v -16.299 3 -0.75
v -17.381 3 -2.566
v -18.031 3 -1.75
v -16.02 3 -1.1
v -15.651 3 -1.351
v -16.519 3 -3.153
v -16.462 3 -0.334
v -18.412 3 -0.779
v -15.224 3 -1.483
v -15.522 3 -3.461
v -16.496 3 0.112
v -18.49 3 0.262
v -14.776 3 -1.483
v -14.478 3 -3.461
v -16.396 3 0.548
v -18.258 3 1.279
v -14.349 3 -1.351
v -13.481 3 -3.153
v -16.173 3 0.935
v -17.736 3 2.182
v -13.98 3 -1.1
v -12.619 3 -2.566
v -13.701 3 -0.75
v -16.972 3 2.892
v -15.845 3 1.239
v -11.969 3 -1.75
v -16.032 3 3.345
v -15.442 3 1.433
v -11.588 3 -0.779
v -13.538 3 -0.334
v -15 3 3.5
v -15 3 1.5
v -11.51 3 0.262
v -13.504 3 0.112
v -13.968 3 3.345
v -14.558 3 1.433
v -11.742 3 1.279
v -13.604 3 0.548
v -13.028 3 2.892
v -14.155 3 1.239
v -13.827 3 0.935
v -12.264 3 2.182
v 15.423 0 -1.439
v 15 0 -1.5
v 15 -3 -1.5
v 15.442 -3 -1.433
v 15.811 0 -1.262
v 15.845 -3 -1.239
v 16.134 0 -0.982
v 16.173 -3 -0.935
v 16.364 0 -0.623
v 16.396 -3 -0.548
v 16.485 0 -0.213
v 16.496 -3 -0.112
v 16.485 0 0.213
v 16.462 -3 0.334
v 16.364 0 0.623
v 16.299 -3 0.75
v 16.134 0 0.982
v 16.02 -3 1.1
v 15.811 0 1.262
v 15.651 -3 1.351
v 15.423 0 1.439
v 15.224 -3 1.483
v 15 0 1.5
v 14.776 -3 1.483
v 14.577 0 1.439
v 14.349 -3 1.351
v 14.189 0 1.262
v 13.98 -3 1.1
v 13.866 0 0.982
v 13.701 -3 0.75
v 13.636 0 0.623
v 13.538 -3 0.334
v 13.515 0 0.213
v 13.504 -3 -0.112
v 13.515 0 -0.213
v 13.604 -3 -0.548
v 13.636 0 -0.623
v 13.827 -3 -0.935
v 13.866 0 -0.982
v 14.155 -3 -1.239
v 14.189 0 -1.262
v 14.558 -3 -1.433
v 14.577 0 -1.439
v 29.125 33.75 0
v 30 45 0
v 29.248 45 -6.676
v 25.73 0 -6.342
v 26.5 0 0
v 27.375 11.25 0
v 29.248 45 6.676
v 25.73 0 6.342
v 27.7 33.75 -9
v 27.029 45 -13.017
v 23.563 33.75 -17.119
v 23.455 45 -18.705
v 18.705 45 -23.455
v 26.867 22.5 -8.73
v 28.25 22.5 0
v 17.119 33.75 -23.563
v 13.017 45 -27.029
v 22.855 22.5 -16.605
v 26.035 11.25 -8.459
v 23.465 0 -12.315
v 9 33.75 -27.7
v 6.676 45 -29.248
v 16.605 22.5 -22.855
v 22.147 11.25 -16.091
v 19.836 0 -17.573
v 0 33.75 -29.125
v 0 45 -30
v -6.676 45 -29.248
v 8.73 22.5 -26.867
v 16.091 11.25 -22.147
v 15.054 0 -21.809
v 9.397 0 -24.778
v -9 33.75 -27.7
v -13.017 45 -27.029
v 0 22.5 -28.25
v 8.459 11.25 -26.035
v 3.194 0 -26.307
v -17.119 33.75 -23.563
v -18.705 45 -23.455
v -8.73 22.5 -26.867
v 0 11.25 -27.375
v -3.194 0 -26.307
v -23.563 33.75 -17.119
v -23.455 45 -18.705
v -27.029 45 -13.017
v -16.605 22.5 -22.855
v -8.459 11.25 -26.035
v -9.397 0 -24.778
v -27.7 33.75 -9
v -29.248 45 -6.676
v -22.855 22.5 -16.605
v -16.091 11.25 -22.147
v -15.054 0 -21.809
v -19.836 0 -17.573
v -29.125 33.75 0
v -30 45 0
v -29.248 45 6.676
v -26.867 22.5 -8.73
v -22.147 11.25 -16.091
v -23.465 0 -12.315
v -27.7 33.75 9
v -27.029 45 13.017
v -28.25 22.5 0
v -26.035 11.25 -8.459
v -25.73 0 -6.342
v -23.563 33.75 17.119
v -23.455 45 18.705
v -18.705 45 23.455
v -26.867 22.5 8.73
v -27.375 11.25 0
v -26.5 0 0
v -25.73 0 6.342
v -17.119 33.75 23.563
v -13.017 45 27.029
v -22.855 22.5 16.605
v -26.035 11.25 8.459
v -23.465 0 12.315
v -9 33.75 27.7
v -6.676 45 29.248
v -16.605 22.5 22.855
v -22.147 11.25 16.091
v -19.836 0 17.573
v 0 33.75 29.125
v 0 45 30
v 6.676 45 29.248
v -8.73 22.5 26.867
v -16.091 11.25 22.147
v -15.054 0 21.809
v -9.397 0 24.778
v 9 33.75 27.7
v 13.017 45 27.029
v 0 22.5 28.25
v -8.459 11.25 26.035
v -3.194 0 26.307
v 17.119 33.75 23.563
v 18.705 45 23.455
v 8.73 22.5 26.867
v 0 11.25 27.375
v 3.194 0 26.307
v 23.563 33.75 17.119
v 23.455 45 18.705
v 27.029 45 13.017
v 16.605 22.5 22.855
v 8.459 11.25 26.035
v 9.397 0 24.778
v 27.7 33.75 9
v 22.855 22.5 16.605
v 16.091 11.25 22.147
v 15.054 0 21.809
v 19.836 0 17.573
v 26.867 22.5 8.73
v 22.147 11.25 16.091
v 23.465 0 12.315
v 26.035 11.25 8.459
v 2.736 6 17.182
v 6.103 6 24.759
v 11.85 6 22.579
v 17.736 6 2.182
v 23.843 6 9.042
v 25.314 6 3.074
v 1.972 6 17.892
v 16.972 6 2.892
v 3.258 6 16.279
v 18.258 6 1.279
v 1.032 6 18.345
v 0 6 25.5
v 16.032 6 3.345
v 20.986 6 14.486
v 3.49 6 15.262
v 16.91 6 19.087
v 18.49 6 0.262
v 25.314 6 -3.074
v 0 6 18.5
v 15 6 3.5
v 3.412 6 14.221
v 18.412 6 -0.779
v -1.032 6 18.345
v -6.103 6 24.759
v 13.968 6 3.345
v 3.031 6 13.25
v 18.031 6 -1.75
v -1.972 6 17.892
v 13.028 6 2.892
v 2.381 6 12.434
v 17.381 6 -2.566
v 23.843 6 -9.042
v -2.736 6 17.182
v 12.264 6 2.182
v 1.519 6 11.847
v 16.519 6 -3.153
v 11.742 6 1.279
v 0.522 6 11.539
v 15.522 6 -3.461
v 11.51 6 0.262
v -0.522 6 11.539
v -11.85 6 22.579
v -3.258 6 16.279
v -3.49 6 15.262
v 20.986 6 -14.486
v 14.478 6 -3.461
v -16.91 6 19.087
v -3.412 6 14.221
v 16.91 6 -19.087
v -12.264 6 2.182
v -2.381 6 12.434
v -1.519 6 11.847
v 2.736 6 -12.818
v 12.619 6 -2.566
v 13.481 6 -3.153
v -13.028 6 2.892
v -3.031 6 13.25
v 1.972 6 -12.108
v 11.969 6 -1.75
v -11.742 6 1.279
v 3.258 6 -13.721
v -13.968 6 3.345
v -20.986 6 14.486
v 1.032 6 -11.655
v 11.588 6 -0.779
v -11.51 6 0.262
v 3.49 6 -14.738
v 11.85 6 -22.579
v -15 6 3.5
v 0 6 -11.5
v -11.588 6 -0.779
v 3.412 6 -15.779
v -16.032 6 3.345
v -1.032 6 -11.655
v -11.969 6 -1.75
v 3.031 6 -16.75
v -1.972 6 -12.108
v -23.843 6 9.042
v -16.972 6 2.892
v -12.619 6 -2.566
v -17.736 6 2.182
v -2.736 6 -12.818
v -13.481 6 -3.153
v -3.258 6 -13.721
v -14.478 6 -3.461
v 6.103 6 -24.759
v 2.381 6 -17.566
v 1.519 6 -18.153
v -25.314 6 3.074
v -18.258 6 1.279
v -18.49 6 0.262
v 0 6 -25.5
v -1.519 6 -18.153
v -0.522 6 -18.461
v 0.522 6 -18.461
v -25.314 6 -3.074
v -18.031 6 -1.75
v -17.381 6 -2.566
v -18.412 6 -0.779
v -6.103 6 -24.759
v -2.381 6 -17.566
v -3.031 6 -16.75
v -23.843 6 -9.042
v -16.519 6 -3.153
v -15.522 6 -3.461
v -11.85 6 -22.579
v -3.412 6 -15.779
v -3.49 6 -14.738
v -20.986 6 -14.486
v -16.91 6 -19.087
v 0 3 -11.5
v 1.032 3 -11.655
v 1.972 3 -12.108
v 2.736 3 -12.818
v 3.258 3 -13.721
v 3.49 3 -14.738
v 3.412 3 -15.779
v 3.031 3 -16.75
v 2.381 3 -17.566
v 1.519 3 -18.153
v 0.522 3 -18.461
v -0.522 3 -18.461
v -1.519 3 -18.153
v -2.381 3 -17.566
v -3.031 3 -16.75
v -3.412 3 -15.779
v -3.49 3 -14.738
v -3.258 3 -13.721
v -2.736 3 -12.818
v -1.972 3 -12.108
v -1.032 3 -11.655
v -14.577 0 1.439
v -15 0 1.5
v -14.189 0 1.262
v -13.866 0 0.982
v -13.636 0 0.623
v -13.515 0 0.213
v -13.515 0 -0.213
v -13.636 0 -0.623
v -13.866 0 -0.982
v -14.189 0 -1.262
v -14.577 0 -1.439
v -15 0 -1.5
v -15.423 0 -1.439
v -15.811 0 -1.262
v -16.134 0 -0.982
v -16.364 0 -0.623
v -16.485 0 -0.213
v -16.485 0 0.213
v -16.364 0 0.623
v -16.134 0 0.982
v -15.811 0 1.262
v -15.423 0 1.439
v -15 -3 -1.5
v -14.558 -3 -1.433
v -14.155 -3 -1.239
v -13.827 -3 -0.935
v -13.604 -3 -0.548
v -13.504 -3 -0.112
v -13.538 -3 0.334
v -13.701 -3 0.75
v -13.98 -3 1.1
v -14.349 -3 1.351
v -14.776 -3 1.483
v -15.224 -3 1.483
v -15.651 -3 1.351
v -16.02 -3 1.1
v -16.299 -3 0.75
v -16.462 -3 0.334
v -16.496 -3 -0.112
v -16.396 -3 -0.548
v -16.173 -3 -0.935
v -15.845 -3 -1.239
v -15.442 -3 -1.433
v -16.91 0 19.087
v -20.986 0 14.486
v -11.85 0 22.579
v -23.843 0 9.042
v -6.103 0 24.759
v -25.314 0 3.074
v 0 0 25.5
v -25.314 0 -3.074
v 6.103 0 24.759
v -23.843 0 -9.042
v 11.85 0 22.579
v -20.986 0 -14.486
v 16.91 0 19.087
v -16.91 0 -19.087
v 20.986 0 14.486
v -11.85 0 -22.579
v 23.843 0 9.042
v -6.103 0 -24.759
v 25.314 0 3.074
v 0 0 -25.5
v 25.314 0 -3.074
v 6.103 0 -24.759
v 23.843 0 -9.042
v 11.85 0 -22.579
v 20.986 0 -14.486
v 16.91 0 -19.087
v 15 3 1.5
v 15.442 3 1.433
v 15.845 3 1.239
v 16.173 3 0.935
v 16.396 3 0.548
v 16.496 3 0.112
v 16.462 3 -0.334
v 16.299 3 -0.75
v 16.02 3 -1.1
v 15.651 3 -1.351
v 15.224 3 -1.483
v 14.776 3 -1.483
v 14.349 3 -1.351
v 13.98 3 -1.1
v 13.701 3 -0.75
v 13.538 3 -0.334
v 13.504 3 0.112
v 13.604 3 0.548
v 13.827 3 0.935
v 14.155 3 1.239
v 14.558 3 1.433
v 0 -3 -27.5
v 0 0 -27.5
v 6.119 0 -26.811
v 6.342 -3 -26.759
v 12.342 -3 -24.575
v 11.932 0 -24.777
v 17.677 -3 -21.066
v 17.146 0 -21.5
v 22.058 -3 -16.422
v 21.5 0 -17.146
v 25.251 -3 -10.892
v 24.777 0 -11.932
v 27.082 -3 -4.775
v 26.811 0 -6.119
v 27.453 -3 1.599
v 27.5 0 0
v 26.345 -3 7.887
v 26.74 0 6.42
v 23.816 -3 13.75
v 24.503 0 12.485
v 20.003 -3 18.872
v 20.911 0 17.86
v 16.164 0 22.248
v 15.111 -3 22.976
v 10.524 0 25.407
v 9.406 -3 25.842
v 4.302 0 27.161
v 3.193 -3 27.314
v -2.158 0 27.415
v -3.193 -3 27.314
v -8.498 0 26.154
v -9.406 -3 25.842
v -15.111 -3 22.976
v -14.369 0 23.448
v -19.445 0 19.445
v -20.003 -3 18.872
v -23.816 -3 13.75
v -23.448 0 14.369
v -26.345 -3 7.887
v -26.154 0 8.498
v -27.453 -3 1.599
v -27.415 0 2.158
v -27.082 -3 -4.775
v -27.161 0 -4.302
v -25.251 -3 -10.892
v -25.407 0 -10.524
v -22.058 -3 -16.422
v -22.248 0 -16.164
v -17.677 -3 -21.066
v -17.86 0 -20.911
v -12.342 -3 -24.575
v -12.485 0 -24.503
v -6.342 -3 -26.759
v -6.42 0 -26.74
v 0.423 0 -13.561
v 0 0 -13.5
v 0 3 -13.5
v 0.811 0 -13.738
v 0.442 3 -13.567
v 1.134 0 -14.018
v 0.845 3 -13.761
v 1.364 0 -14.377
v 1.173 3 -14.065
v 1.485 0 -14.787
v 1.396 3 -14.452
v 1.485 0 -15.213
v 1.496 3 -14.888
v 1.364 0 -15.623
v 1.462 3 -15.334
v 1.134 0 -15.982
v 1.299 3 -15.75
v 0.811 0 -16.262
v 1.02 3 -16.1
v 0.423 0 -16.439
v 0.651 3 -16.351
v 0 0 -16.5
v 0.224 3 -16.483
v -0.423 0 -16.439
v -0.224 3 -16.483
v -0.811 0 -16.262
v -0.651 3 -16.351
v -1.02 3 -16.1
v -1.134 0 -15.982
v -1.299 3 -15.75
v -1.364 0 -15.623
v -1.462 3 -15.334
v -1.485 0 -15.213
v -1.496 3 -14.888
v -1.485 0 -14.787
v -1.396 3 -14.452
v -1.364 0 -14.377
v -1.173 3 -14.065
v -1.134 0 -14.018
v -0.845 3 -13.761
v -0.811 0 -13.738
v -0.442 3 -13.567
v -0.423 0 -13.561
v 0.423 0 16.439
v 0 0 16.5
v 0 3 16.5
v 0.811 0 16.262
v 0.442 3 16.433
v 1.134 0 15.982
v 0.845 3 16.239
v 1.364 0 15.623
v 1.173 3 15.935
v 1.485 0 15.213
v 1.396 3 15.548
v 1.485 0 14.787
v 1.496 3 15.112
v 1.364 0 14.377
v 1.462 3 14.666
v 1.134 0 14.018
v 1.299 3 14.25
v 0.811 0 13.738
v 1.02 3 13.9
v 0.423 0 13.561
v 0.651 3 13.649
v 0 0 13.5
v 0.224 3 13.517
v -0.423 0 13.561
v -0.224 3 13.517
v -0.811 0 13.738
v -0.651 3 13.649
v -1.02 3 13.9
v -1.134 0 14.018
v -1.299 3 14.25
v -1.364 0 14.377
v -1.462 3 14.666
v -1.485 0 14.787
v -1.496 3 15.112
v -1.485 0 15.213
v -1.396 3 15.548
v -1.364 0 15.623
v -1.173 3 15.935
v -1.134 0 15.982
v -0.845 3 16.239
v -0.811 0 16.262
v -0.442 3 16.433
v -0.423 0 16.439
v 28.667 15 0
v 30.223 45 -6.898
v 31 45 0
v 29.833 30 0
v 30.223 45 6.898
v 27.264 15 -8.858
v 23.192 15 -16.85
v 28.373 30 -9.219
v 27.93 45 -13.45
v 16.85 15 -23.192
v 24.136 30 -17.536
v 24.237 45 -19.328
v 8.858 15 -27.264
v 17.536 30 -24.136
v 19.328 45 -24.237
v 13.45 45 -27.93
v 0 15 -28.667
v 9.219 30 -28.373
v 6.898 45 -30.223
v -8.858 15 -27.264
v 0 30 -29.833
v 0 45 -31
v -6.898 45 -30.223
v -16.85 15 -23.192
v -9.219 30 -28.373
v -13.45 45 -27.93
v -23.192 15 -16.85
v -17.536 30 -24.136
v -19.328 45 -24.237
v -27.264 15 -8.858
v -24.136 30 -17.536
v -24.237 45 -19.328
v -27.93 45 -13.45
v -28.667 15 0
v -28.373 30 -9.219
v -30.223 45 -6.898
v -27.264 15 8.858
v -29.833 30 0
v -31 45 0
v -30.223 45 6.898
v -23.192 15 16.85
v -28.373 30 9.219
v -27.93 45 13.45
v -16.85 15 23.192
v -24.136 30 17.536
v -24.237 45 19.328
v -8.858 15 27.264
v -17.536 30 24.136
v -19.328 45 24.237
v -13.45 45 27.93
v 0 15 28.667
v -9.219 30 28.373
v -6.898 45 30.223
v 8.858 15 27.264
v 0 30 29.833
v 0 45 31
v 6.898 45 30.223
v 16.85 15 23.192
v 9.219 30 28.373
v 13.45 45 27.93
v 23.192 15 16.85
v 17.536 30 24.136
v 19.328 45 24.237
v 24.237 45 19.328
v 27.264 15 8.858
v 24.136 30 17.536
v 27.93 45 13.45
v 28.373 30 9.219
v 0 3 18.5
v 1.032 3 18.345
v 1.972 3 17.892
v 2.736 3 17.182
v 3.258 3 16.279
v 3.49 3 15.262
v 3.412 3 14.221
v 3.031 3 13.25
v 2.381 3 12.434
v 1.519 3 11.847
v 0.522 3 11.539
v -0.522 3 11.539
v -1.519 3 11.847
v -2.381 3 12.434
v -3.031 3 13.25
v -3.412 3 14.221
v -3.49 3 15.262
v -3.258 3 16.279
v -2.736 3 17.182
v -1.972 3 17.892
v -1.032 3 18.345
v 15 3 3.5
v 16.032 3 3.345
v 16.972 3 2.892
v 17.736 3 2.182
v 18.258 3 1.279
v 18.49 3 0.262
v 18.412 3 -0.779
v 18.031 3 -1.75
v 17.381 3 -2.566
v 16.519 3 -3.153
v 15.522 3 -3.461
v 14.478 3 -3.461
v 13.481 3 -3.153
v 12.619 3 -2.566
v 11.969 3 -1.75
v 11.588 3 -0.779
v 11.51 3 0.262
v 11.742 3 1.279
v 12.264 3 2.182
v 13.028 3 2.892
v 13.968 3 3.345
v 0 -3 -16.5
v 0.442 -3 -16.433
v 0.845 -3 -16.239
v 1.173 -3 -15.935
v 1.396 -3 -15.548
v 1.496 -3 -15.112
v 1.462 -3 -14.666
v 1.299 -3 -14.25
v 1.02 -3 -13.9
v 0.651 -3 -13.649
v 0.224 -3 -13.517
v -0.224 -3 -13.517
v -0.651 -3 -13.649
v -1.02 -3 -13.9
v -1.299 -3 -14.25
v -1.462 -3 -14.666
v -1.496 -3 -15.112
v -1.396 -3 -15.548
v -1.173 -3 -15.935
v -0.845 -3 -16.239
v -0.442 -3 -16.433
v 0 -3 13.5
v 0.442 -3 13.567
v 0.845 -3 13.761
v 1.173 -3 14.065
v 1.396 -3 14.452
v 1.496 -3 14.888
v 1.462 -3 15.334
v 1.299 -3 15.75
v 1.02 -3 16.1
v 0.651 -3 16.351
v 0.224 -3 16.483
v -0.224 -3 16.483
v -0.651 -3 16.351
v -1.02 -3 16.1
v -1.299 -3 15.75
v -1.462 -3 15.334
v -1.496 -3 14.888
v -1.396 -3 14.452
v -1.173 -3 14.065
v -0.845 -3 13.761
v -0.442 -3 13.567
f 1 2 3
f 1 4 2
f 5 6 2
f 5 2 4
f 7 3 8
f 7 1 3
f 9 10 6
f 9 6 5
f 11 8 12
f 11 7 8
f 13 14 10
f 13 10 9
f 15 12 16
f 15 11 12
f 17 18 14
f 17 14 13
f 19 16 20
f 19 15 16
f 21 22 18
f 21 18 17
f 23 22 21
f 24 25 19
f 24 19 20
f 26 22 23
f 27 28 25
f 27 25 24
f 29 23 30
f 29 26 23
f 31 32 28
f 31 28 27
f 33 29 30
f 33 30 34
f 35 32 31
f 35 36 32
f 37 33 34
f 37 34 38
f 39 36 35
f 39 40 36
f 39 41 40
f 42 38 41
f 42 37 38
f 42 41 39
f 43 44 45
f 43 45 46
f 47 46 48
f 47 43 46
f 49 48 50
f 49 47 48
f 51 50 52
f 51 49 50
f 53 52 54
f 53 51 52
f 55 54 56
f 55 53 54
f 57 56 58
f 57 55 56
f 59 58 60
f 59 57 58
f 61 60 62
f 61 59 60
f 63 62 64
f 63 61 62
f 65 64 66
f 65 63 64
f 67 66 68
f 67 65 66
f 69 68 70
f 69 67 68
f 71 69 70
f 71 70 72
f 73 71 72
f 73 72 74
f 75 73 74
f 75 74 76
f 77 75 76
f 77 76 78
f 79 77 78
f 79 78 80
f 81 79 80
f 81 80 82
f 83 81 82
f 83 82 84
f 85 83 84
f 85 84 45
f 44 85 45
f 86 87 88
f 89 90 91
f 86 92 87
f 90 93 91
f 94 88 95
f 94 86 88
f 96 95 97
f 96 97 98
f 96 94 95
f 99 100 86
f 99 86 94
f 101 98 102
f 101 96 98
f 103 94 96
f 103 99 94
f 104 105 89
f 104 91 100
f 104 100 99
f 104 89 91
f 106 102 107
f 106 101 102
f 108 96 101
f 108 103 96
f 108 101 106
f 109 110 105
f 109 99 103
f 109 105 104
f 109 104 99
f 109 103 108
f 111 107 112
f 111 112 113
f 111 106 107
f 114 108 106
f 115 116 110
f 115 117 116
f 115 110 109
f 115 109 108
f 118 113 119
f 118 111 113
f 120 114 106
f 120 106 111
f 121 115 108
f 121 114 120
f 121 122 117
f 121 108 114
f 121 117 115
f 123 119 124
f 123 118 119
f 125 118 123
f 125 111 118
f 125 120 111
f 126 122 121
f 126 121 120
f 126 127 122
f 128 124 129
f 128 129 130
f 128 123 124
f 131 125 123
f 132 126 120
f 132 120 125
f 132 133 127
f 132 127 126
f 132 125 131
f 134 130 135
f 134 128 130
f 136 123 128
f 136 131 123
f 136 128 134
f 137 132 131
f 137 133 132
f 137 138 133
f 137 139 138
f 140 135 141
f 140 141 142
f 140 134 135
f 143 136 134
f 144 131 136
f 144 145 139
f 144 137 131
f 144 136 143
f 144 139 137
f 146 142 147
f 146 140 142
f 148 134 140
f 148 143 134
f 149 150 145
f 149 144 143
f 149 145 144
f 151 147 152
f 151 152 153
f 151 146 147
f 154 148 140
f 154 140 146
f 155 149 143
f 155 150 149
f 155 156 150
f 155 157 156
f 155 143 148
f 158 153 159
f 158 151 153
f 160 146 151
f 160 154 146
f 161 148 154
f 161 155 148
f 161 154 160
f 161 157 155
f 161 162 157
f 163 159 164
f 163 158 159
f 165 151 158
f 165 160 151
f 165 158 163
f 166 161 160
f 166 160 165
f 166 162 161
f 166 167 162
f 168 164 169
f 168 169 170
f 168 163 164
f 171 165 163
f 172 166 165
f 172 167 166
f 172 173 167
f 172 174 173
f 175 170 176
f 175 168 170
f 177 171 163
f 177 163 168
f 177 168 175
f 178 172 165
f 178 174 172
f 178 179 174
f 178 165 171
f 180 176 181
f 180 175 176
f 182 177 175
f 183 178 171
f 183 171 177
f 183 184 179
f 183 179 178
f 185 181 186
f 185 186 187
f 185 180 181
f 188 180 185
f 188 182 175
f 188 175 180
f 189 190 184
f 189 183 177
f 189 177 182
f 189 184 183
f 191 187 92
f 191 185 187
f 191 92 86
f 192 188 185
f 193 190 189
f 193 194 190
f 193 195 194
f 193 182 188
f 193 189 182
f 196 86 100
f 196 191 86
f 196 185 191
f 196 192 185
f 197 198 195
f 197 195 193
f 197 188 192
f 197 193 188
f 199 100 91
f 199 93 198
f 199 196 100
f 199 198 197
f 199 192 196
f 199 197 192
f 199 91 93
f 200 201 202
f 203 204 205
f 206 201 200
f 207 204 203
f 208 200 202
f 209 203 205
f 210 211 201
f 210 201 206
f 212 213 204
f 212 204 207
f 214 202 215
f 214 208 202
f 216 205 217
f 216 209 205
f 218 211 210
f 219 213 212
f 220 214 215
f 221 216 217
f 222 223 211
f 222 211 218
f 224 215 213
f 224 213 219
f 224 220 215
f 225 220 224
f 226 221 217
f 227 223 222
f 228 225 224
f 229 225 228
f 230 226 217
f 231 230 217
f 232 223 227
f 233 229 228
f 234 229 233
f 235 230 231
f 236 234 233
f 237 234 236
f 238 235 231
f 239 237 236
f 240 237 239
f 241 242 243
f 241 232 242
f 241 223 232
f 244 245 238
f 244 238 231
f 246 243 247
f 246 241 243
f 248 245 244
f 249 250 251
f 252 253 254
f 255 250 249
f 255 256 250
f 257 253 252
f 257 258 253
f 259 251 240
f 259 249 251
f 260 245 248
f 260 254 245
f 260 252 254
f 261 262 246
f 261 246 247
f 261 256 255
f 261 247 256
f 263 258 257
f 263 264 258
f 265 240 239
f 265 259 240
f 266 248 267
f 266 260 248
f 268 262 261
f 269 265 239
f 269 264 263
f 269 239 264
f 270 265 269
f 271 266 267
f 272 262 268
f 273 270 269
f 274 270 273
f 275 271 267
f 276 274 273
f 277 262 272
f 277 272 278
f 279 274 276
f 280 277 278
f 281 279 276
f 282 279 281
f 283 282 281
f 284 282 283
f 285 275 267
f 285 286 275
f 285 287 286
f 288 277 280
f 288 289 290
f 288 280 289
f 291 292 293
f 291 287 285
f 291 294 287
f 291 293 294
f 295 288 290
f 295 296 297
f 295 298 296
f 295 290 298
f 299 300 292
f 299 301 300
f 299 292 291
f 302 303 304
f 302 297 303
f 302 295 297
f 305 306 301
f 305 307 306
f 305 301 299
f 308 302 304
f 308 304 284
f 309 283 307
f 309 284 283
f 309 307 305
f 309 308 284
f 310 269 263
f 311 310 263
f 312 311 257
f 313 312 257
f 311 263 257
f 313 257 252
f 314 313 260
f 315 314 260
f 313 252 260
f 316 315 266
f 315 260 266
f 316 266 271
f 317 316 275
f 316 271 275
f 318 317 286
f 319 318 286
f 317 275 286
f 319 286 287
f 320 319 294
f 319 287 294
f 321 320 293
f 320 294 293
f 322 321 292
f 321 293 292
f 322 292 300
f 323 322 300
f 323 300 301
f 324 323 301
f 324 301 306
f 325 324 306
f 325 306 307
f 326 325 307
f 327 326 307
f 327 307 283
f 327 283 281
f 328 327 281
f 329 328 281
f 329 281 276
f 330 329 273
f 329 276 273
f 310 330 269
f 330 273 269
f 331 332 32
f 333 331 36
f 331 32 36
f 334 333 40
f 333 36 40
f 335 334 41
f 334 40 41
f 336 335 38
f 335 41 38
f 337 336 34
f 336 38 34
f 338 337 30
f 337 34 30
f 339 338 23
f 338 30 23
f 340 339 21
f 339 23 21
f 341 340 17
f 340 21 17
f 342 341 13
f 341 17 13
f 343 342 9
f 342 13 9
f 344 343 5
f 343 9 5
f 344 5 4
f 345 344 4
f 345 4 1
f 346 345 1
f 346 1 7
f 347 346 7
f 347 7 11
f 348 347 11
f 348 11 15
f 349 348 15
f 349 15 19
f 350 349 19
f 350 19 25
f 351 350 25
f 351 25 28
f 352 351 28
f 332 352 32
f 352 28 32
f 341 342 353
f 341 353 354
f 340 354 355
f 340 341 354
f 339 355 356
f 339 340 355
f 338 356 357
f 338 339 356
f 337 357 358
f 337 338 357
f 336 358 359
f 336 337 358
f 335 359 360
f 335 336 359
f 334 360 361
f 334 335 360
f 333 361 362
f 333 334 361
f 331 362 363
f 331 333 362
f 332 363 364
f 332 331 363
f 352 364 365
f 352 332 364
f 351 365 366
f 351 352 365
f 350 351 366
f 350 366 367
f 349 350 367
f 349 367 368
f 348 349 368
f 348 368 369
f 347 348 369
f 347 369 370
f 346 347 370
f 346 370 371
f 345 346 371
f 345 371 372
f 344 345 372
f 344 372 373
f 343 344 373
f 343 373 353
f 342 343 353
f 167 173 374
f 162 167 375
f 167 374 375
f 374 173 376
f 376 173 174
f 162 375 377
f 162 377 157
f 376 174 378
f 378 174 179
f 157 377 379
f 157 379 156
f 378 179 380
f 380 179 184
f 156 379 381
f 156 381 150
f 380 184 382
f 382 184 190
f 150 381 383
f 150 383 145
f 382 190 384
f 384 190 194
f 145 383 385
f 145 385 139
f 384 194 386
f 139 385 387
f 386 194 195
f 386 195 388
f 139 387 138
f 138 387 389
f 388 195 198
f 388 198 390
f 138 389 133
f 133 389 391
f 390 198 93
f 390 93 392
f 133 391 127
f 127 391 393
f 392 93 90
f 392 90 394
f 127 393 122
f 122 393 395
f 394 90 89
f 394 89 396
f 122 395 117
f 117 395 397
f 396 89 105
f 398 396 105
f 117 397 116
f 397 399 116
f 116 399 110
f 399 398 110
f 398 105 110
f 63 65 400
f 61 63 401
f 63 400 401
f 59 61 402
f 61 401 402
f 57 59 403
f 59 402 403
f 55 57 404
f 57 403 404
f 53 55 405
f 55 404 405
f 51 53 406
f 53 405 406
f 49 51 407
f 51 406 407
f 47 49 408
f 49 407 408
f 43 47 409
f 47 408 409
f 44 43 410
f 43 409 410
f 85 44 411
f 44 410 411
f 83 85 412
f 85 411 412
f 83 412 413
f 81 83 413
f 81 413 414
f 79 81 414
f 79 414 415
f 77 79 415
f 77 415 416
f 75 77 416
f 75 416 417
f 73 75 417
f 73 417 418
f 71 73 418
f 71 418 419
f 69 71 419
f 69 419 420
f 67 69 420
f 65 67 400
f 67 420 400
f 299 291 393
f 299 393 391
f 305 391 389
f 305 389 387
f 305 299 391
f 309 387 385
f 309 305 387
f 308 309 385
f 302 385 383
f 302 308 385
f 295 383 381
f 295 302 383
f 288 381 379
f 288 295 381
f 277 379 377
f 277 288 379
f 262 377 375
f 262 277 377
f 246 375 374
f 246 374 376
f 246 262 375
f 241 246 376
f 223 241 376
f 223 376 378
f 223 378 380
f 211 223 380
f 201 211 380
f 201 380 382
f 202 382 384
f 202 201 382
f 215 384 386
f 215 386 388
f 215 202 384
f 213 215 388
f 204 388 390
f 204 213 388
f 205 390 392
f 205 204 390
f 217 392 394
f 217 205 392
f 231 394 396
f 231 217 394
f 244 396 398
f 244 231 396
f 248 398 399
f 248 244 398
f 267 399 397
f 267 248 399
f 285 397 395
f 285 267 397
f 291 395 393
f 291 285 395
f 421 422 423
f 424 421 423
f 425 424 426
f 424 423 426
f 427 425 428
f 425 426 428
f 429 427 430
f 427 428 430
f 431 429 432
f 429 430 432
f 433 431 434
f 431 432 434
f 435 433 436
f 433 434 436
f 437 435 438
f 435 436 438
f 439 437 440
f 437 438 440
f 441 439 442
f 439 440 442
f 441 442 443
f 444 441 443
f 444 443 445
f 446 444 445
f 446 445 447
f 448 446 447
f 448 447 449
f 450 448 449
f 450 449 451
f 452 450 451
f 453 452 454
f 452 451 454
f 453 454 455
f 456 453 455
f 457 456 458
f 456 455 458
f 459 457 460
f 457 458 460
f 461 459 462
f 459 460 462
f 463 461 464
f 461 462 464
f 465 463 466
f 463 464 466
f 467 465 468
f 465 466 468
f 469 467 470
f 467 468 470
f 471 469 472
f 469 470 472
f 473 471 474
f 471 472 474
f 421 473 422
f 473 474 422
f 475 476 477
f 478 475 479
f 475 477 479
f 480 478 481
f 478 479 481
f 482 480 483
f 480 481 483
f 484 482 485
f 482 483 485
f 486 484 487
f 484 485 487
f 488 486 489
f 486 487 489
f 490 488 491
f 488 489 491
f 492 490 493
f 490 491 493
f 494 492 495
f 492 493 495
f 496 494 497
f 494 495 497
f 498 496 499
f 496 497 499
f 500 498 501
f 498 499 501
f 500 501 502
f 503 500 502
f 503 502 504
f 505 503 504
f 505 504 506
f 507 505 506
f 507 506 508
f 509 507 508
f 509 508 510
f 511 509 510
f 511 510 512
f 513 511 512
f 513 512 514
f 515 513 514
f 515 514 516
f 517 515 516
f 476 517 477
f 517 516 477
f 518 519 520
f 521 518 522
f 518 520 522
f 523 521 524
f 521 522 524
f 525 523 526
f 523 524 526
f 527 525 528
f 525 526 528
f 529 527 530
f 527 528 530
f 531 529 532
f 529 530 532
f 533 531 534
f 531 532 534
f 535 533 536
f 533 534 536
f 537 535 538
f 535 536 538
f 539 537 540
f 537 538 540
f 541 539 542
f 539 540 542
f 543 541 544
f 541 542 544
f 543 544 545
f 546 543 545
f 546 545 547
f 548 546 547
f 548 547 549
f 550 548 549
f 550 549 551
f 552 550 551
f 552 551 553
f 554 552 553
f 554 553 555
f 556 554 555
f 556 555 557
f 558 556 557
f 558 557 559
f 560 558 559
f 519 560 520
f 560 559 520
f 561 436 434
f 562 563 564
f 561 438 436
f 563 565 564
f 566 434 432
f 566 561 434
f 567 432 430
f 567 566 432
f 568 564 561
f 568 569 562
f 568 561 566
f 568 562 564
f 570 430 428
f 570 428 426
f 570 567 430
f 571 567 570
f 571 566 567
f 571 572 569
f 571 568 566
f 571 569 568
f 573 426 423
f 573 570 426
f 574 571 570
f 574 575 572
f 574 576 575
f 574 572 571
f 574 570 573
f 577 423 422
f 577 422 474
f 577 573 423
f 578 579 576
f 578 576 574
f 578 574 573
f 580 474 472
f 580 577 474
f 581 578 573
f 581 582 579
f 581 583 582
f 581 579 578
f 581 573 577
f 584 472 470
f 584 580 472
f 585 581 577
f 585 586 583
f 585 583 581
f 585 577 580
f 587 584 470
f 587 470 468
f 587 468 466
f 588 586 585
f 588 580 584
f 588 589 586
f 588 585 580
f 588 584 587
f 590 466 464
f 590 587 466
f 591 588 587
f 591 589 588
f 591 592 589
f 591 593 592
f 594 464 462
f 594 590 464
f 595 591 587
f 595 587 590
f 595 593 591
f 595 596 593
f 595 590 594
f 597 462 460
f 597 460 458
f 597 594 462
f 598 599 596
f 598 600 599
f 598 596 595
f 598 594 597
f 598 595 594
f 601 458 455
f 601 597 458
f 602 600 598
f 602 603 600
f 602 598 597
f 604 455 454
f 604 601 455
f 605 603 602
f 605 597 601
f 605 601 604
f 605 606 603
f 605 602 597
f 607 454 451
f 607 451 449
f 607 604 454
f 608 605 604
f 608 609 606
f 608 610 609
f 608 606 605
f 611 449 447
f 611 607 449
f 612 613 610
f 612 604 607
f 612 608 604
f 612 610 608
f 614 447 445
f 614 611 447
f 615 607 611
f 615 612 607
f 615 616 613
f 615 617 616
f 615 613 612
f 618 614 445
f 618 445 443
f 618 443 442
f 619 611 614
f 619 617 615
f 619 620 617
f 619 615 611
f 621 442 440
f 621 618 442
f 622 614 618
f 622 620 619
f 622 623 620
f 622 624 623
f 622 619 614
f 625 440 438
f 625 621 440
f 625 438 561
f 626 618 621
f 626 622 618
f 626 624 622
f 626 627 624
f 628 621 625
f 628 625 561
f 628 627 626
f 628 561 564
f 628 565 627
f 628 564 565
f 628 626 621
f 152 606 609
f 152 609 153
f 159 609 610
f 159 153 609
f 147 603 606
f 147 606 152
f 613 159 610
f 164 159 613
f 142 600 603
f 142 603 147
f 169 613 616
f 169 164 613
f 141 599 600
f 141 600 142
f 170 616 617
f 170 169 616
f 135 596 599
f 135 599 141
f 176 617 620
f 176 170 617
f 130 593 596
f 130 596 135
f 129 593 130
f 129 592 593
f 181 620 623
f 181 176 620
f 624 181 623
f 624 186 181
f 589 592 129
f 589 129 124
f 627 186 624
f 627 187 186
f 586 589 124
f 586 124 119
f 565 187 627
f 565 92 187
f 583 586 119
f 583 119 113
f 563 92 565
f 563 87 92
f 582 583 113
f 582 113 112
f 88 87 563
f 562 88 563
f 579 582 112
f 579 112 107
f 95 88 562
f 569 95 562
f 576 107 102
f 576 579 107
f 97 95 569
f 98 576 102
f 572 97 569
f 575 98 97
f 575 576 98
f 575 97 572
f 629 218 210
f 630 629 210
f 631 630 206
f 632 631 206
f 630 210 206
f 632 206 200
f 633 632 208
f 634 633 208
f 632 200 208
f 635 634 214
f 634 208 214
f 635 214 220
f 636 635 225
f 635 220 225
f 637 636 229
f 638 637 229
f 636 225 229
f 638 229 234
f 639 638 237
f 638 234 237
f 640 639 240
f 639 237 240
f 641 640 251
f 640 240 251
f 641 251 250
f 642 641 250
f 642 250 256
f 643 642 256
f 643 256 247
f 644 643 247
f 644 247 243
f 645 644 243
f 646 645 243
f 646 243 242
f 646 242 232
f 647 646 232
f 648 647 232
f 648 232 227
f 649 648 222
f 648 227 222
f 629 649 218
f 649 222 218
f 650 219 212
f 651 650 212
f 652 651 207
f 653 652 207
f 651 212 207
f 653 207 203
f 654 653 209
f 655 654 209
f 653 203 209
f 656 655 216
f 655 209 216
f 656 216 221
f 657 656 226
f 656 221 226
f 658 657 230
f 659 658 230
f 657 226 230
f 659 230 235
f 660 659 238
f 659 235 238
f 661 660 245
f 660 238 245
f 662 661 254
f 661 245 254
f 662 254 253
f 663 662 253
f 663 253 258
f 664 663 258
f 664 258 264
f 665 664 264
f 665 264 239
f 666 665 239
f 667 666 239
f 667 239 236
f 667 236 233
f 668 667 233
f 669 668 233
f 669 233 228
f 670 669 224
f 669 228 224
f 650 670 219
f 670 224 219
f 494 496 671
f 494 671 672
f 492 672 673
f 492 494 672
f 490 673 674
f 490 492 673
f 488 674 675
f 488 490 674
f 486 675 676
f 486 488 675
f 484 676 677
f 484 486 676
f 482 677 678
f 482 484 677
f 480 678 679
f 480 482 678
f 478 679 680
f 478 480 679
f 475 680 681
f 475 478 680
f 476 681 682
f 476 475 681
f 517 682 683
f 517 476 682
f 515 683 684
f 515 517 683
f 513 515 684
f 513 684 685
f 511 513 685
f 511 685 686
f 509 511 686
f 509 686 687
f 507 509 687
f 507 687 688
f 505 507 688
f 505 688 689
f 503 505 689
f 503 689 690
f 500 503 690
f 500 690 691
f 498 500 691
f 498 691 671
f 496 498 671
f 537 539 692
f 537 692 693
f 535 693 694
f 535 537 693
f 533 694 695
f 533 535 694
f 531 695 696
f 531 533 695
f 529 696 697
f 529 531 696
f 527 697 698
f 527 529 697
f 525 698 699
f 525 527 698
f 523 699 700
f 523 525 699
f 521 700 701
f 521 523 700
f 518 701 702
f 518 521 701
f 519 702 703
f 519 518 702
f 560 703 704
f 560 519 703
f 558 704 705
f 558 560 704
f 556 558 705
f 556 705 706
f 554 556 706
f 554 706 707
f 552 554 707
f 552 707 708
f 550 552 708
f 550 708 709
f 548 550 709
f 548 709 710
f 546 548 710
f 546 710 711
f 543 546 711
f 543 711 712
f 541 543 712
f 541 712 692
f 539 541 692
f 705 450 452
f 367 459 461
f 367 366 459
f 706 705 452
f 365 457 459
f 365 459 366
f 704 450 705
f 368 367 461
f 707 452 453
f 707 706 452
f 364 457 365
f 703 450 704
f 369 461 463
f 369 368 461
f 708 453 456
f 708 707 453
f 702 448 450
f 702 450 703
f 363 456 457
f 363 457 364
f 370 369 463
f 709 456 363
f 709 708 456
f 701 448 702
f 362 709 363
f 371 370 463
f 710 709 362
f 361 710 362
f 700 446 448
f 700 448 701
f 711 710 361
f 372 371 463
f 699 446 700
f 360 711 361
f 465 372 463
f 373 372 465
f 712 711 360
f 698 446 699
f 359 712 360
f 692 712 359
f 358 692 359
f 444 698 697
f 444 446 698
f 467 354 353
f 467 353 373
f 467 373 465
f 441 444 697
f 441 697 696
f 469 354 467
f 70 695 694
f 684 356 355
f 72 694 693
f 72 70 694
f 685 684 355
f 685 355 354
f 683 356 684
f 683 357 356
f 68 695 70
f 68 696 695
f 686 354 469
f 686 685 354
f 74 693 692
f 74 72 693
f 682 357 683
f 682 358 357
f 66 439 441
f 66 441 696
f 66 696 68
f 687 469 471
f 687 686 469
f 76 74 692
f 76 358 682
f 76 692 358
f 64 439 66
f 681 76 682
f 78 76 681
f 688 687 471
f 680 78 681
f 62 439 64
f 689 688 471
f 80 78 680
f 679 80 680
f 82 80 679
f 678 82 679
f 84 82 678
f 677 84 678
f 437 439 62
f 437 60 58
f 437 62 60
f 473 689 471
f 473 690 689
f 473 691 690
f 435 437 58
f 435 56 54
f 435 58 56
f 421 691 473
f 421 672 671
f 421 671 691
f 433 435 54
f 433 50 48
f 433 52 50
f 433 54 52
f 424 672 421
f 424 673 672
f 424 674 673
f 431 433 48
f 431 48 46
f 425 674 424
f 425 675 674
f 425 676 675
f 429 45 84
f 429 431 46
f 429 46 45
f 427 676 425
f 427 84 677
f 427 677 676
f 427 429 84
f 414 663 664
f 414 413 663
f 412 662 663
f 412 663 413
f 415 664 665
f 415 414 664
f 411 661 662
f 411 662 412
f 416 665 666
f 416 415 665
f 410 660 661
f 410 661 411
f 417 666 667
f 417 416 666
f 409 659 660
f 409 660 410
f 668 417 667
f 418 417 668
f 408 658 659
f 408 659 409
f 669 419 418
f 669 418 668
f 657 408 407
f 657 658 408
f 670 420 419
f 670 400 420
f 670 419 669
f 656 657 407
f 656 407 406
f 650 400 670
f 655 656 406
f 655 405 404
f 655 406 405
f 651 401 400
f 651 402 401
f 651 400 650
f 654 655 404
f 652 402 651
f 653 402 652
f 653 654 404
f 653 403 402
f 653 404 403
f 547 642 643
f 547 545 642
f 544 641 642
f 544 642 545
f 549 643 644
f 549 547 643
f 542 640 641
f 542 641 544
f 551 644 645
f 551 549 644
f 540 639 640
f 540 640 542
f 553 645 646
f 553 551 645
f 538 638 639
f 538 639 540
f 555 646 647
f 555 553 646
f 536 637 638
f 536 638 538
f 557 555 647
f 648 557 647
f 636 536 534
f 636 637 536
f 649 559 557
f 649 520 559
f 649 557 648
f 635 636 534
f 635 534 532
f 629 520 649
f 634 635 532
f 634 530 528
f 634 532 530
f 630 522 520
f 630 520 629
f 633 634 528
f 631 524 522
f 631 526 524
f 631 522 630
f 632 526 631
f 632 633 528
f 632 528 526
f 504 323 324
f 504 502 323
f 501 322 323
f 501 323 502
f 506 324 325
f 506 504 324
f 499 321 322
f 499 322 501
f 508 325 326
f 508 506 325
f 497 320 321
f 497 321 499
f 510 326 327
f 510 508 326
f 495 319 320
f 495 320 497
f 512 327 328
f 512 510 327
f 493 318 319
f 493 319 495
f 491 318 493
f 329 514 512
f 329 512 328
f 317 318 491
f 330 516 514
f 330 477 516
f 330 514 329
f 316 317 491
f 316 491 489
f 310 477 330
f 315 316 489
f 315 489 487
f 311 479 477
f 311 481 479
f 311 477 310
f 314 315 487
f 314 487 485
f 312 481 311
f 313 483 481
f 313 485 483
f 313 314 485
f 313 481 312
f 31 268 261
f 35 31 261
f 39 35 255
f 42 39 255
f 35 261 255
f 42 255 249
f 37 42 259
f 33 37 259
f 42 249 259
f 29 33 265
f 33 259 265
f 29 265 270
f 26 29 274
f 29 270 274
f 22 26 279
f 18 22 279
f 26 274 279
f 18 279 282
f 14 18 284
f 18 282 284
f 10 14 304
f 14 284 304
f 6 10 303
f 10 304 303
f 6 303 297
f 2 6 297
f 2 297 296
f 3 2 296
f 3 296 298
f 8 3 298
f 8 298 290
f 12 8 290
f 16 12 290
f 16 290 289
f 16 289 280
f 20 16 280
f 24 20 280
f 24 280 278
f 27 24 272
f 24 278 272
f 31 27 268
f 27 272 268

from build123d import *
from build123d.topology import SkipClean

# Parameters (mm, degrees)
SKETCH1_R           = 27.5
SKETCH3_R           = 31
SKETCH3_4_R         = 30
SKETCH1_4_R         = 26.5
SKETCH4_R           = 27.5
SKETCH4_R_2         = 1.5
BOSS_EXTRUDE1_DEPTH = 3
BOSS_EXTRUDE2_START = 6
SKETCH6_R           = 25.5
SKETCH6_R_2         = 1.5
BOSS_EXTRUDE2_DEPTH = 6
SKETCH7_R           = 3.5
CUT_EXTRUDE1_DEPTH  = 3


with BuildPart() as part:
    # Sketch1 → Loft1 section 0
    with BuildSketch(Plane(origin=(0, 0, 0), x_dir=(1, 0, 0), z_dir=(0, 1, 0))):
        Circle(SKETCH1_R)
    # Sketch3 → Loft1 section 1
    with BuildSketch(Plane(origin=(0, 45, 0), x_dir=(1, 0, 0), z_dir=(0, 1, 0))):
        Circle(SKETCH3_R)
    loft()

    # Sketch3<4> → Cut-Loft1 section 0
    with BuildSketch(Plane(origin=(0, 45, 0), x_dir=(1, 0, 0), z_dir=(0, 1, 0))):
        Circle(SKETCH3_4_R)
    # Sketch1<4> → Cut-Loft1 section 1
    with BuildSketch(Plane(origin=(0, 0, 0), x_dir=(1, 0, 0), z_dir=(0, 1, 0))):
        Circle(SKETCH1_4_R)
    loft(mode=Mode.SUBTRACT)

    # Sketch4 → Boss-Extrude1 (add)
    with BuildSketch(Plane.XZ):
        with Locations(Location((0, 0, 0), (0, 0, 270))):
            Circle(SKETCH4_R)
        with Locations(Location((0, 15, 0), (0, 0, 270))):
            Circle(SKETCH4_R_2, mode=Mode.SUBTRACT)
        with Locations(Location((15, 0, 0), (0, 0, 270))):
            Circle(SKETCH4_R_2, mode=Mode.SUBTRACT)
        with Locations(Location((0, -15, 0), (0, 0, 270))):
            Circle(SKETCH4_R_2, mode=Mode.SUBTRACT)
        with Locations(Location((-15, 0, 0), (0, 0, 270))):
            Circle(SKETCH4_R_2, mode=Mode.SUBTRACT)
    extrude(amount=BOSS_EXTRUDE1_DEPTH)

    # Sketch6 → Boss-Extrude2 (add)
    with SkipClean():  # the faces are left unmerged after this step: merging them gives an invalid solid
        with BuildSketch(Plane(origin=(0, 0, 0), x_dir=(1, 0, 0), z_dir=(0, 1, 0)).offset(BOSS_EXTRUDE2_START)):
            with Locations(Location((0, 0, 0), (0, 0, 90))):
                Circle(SKETCH6_R)
            with Locations(Location((0, 15, 0), (0, 0, 270))):
                Circle(SKETCH6_R_2, mode=Mode.SUBTRACT)
            with Locations(Location((15, 0, 0), (0, 0, 270))):
                Circle(SKETCH6_R_2, mode=Mode.SUBTRACT)
            with Locations(Location((0, -15, 0), (0, 0, 270))):
                Circle(SKETCH6_R_2, mode=Mode.SUBTRACT)
            with Locations(Location((-15, 0, 0), (0, 0, 270))):
                Circle(SKETCH6_R_2, mode=Mode.SUBTRACT)
        extrude(amount=-BOSS_EXTRUDE2_DEPTH)

    # Sketch7 → Cut-Extrude1 (cut)
    with SkipClean():  # the faces are left unmerged after this step: merging them gives an invalid solid
        with BuildSketch(Plane(origin=(0, 6, 0), x_dir=(1, 0, 0), z_dir=(0, 1, 0))):
            with Locations(Location((0, 15, 0), (0, 0, 270))):
                Circle(SKETCH7_R)
            with Locations(Location((15, 0, 0), (0, 0, 270))):
                Circle(SKETCH7_R)
            with Locations(Location((0, -15, 0), (0, 0, 270))):
                Circle(SKETCH7_R)
            with Locations(Location((-15, 0, 0), (0, 0, 270))):
                Circle(SKETCH7_R)
        extrude(amount=-CUT_EXTRUDE1_DEPTH, mode=Mode.SUBTRACT)


solid = part.part
